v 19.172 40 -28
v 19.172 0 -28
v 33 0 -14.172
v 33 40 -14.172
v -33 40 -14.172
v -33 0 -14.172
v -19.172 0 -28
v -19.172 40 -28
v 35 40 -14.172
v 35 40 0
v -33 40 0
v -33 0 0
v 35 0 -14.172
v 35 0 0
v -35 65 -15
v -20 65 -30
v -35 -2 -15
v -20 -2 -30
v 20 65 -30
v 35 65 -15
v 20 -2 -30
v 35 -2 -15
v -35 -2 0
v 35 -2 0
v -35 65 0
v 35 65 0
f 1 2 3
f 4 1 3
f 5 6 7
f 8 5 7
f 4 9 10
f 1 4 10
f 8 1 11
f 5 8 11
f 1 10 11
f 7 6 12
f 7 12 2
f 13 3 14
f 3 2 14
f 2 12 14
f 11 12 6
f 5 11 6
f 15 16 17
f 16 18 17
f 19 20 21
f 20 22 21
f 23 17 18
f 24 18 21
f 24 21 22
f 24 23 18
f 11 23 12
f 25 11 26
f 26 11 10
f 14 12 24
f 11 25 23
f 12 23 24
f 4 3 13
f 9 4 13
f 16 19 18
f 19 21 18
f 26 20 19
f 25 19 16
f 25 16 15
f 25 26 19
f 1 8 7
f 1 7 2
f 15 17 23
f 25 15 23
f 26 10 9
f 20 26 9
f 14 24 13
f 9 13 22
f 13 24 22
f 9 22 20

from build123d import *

# Parameters (mm, degrees)
F1_DEPTH = 2
F3_DEPTH = 40
F5_DEPTH = 25


with BuildPart() as f1:
    # F0 (on Front) → F1 (new body)
    with BuildSketch(Plane.XZ):
        Polygon((35, -15), (35, 0), (-35, 0), (-35, -15), (-20, -30), (20, -30), align=None)
    extrude(amount=F1_DEPTH)

    # F2 (on face) → F3 (join)
    with BuildSketch(Plane(origin=(0, 0, 0), x_dir=(-1, 0, 0), z_dir=(0, 1, 0))):
        Polygon((33, -14.1715728753), (19.1715728753, -28), (-19.1715728753, -28), (-33, -14.1715728753), (-35, -14.1715728753), (-35, -15), (-20, -30), (20, -30), (35, -15), (35, 0), (33, 0), (33, -2), align=None)
    extrude(amount=F3_DEPTH)

    # F4 (on face) → F5 (join)
    with BuildSketch(Plane(origin=(0, 40, 0), x_dir=(-1, 0, 0), z_dir=(0, 1, 0))):
        Polygon((-19.1715728753, -28), (19.1715728753, -28), (33, -14.1715728753), (33, 0), (-35, 0), (-35, -14.1715728753), (-33, -14.1715728753), align=None)
        Polygon((33, -14.1715728753), (19.1715728753, -28), (-19.1715728753, -28), (-33, -14.1715728753), (-35, -14.1715728753), (-35, -15), (-20, -30), (20, -30), (35, -15), (35, 0), (33, 0), align=None)
    extrude(amount=F5_DEPTH)


solid = f1.part
